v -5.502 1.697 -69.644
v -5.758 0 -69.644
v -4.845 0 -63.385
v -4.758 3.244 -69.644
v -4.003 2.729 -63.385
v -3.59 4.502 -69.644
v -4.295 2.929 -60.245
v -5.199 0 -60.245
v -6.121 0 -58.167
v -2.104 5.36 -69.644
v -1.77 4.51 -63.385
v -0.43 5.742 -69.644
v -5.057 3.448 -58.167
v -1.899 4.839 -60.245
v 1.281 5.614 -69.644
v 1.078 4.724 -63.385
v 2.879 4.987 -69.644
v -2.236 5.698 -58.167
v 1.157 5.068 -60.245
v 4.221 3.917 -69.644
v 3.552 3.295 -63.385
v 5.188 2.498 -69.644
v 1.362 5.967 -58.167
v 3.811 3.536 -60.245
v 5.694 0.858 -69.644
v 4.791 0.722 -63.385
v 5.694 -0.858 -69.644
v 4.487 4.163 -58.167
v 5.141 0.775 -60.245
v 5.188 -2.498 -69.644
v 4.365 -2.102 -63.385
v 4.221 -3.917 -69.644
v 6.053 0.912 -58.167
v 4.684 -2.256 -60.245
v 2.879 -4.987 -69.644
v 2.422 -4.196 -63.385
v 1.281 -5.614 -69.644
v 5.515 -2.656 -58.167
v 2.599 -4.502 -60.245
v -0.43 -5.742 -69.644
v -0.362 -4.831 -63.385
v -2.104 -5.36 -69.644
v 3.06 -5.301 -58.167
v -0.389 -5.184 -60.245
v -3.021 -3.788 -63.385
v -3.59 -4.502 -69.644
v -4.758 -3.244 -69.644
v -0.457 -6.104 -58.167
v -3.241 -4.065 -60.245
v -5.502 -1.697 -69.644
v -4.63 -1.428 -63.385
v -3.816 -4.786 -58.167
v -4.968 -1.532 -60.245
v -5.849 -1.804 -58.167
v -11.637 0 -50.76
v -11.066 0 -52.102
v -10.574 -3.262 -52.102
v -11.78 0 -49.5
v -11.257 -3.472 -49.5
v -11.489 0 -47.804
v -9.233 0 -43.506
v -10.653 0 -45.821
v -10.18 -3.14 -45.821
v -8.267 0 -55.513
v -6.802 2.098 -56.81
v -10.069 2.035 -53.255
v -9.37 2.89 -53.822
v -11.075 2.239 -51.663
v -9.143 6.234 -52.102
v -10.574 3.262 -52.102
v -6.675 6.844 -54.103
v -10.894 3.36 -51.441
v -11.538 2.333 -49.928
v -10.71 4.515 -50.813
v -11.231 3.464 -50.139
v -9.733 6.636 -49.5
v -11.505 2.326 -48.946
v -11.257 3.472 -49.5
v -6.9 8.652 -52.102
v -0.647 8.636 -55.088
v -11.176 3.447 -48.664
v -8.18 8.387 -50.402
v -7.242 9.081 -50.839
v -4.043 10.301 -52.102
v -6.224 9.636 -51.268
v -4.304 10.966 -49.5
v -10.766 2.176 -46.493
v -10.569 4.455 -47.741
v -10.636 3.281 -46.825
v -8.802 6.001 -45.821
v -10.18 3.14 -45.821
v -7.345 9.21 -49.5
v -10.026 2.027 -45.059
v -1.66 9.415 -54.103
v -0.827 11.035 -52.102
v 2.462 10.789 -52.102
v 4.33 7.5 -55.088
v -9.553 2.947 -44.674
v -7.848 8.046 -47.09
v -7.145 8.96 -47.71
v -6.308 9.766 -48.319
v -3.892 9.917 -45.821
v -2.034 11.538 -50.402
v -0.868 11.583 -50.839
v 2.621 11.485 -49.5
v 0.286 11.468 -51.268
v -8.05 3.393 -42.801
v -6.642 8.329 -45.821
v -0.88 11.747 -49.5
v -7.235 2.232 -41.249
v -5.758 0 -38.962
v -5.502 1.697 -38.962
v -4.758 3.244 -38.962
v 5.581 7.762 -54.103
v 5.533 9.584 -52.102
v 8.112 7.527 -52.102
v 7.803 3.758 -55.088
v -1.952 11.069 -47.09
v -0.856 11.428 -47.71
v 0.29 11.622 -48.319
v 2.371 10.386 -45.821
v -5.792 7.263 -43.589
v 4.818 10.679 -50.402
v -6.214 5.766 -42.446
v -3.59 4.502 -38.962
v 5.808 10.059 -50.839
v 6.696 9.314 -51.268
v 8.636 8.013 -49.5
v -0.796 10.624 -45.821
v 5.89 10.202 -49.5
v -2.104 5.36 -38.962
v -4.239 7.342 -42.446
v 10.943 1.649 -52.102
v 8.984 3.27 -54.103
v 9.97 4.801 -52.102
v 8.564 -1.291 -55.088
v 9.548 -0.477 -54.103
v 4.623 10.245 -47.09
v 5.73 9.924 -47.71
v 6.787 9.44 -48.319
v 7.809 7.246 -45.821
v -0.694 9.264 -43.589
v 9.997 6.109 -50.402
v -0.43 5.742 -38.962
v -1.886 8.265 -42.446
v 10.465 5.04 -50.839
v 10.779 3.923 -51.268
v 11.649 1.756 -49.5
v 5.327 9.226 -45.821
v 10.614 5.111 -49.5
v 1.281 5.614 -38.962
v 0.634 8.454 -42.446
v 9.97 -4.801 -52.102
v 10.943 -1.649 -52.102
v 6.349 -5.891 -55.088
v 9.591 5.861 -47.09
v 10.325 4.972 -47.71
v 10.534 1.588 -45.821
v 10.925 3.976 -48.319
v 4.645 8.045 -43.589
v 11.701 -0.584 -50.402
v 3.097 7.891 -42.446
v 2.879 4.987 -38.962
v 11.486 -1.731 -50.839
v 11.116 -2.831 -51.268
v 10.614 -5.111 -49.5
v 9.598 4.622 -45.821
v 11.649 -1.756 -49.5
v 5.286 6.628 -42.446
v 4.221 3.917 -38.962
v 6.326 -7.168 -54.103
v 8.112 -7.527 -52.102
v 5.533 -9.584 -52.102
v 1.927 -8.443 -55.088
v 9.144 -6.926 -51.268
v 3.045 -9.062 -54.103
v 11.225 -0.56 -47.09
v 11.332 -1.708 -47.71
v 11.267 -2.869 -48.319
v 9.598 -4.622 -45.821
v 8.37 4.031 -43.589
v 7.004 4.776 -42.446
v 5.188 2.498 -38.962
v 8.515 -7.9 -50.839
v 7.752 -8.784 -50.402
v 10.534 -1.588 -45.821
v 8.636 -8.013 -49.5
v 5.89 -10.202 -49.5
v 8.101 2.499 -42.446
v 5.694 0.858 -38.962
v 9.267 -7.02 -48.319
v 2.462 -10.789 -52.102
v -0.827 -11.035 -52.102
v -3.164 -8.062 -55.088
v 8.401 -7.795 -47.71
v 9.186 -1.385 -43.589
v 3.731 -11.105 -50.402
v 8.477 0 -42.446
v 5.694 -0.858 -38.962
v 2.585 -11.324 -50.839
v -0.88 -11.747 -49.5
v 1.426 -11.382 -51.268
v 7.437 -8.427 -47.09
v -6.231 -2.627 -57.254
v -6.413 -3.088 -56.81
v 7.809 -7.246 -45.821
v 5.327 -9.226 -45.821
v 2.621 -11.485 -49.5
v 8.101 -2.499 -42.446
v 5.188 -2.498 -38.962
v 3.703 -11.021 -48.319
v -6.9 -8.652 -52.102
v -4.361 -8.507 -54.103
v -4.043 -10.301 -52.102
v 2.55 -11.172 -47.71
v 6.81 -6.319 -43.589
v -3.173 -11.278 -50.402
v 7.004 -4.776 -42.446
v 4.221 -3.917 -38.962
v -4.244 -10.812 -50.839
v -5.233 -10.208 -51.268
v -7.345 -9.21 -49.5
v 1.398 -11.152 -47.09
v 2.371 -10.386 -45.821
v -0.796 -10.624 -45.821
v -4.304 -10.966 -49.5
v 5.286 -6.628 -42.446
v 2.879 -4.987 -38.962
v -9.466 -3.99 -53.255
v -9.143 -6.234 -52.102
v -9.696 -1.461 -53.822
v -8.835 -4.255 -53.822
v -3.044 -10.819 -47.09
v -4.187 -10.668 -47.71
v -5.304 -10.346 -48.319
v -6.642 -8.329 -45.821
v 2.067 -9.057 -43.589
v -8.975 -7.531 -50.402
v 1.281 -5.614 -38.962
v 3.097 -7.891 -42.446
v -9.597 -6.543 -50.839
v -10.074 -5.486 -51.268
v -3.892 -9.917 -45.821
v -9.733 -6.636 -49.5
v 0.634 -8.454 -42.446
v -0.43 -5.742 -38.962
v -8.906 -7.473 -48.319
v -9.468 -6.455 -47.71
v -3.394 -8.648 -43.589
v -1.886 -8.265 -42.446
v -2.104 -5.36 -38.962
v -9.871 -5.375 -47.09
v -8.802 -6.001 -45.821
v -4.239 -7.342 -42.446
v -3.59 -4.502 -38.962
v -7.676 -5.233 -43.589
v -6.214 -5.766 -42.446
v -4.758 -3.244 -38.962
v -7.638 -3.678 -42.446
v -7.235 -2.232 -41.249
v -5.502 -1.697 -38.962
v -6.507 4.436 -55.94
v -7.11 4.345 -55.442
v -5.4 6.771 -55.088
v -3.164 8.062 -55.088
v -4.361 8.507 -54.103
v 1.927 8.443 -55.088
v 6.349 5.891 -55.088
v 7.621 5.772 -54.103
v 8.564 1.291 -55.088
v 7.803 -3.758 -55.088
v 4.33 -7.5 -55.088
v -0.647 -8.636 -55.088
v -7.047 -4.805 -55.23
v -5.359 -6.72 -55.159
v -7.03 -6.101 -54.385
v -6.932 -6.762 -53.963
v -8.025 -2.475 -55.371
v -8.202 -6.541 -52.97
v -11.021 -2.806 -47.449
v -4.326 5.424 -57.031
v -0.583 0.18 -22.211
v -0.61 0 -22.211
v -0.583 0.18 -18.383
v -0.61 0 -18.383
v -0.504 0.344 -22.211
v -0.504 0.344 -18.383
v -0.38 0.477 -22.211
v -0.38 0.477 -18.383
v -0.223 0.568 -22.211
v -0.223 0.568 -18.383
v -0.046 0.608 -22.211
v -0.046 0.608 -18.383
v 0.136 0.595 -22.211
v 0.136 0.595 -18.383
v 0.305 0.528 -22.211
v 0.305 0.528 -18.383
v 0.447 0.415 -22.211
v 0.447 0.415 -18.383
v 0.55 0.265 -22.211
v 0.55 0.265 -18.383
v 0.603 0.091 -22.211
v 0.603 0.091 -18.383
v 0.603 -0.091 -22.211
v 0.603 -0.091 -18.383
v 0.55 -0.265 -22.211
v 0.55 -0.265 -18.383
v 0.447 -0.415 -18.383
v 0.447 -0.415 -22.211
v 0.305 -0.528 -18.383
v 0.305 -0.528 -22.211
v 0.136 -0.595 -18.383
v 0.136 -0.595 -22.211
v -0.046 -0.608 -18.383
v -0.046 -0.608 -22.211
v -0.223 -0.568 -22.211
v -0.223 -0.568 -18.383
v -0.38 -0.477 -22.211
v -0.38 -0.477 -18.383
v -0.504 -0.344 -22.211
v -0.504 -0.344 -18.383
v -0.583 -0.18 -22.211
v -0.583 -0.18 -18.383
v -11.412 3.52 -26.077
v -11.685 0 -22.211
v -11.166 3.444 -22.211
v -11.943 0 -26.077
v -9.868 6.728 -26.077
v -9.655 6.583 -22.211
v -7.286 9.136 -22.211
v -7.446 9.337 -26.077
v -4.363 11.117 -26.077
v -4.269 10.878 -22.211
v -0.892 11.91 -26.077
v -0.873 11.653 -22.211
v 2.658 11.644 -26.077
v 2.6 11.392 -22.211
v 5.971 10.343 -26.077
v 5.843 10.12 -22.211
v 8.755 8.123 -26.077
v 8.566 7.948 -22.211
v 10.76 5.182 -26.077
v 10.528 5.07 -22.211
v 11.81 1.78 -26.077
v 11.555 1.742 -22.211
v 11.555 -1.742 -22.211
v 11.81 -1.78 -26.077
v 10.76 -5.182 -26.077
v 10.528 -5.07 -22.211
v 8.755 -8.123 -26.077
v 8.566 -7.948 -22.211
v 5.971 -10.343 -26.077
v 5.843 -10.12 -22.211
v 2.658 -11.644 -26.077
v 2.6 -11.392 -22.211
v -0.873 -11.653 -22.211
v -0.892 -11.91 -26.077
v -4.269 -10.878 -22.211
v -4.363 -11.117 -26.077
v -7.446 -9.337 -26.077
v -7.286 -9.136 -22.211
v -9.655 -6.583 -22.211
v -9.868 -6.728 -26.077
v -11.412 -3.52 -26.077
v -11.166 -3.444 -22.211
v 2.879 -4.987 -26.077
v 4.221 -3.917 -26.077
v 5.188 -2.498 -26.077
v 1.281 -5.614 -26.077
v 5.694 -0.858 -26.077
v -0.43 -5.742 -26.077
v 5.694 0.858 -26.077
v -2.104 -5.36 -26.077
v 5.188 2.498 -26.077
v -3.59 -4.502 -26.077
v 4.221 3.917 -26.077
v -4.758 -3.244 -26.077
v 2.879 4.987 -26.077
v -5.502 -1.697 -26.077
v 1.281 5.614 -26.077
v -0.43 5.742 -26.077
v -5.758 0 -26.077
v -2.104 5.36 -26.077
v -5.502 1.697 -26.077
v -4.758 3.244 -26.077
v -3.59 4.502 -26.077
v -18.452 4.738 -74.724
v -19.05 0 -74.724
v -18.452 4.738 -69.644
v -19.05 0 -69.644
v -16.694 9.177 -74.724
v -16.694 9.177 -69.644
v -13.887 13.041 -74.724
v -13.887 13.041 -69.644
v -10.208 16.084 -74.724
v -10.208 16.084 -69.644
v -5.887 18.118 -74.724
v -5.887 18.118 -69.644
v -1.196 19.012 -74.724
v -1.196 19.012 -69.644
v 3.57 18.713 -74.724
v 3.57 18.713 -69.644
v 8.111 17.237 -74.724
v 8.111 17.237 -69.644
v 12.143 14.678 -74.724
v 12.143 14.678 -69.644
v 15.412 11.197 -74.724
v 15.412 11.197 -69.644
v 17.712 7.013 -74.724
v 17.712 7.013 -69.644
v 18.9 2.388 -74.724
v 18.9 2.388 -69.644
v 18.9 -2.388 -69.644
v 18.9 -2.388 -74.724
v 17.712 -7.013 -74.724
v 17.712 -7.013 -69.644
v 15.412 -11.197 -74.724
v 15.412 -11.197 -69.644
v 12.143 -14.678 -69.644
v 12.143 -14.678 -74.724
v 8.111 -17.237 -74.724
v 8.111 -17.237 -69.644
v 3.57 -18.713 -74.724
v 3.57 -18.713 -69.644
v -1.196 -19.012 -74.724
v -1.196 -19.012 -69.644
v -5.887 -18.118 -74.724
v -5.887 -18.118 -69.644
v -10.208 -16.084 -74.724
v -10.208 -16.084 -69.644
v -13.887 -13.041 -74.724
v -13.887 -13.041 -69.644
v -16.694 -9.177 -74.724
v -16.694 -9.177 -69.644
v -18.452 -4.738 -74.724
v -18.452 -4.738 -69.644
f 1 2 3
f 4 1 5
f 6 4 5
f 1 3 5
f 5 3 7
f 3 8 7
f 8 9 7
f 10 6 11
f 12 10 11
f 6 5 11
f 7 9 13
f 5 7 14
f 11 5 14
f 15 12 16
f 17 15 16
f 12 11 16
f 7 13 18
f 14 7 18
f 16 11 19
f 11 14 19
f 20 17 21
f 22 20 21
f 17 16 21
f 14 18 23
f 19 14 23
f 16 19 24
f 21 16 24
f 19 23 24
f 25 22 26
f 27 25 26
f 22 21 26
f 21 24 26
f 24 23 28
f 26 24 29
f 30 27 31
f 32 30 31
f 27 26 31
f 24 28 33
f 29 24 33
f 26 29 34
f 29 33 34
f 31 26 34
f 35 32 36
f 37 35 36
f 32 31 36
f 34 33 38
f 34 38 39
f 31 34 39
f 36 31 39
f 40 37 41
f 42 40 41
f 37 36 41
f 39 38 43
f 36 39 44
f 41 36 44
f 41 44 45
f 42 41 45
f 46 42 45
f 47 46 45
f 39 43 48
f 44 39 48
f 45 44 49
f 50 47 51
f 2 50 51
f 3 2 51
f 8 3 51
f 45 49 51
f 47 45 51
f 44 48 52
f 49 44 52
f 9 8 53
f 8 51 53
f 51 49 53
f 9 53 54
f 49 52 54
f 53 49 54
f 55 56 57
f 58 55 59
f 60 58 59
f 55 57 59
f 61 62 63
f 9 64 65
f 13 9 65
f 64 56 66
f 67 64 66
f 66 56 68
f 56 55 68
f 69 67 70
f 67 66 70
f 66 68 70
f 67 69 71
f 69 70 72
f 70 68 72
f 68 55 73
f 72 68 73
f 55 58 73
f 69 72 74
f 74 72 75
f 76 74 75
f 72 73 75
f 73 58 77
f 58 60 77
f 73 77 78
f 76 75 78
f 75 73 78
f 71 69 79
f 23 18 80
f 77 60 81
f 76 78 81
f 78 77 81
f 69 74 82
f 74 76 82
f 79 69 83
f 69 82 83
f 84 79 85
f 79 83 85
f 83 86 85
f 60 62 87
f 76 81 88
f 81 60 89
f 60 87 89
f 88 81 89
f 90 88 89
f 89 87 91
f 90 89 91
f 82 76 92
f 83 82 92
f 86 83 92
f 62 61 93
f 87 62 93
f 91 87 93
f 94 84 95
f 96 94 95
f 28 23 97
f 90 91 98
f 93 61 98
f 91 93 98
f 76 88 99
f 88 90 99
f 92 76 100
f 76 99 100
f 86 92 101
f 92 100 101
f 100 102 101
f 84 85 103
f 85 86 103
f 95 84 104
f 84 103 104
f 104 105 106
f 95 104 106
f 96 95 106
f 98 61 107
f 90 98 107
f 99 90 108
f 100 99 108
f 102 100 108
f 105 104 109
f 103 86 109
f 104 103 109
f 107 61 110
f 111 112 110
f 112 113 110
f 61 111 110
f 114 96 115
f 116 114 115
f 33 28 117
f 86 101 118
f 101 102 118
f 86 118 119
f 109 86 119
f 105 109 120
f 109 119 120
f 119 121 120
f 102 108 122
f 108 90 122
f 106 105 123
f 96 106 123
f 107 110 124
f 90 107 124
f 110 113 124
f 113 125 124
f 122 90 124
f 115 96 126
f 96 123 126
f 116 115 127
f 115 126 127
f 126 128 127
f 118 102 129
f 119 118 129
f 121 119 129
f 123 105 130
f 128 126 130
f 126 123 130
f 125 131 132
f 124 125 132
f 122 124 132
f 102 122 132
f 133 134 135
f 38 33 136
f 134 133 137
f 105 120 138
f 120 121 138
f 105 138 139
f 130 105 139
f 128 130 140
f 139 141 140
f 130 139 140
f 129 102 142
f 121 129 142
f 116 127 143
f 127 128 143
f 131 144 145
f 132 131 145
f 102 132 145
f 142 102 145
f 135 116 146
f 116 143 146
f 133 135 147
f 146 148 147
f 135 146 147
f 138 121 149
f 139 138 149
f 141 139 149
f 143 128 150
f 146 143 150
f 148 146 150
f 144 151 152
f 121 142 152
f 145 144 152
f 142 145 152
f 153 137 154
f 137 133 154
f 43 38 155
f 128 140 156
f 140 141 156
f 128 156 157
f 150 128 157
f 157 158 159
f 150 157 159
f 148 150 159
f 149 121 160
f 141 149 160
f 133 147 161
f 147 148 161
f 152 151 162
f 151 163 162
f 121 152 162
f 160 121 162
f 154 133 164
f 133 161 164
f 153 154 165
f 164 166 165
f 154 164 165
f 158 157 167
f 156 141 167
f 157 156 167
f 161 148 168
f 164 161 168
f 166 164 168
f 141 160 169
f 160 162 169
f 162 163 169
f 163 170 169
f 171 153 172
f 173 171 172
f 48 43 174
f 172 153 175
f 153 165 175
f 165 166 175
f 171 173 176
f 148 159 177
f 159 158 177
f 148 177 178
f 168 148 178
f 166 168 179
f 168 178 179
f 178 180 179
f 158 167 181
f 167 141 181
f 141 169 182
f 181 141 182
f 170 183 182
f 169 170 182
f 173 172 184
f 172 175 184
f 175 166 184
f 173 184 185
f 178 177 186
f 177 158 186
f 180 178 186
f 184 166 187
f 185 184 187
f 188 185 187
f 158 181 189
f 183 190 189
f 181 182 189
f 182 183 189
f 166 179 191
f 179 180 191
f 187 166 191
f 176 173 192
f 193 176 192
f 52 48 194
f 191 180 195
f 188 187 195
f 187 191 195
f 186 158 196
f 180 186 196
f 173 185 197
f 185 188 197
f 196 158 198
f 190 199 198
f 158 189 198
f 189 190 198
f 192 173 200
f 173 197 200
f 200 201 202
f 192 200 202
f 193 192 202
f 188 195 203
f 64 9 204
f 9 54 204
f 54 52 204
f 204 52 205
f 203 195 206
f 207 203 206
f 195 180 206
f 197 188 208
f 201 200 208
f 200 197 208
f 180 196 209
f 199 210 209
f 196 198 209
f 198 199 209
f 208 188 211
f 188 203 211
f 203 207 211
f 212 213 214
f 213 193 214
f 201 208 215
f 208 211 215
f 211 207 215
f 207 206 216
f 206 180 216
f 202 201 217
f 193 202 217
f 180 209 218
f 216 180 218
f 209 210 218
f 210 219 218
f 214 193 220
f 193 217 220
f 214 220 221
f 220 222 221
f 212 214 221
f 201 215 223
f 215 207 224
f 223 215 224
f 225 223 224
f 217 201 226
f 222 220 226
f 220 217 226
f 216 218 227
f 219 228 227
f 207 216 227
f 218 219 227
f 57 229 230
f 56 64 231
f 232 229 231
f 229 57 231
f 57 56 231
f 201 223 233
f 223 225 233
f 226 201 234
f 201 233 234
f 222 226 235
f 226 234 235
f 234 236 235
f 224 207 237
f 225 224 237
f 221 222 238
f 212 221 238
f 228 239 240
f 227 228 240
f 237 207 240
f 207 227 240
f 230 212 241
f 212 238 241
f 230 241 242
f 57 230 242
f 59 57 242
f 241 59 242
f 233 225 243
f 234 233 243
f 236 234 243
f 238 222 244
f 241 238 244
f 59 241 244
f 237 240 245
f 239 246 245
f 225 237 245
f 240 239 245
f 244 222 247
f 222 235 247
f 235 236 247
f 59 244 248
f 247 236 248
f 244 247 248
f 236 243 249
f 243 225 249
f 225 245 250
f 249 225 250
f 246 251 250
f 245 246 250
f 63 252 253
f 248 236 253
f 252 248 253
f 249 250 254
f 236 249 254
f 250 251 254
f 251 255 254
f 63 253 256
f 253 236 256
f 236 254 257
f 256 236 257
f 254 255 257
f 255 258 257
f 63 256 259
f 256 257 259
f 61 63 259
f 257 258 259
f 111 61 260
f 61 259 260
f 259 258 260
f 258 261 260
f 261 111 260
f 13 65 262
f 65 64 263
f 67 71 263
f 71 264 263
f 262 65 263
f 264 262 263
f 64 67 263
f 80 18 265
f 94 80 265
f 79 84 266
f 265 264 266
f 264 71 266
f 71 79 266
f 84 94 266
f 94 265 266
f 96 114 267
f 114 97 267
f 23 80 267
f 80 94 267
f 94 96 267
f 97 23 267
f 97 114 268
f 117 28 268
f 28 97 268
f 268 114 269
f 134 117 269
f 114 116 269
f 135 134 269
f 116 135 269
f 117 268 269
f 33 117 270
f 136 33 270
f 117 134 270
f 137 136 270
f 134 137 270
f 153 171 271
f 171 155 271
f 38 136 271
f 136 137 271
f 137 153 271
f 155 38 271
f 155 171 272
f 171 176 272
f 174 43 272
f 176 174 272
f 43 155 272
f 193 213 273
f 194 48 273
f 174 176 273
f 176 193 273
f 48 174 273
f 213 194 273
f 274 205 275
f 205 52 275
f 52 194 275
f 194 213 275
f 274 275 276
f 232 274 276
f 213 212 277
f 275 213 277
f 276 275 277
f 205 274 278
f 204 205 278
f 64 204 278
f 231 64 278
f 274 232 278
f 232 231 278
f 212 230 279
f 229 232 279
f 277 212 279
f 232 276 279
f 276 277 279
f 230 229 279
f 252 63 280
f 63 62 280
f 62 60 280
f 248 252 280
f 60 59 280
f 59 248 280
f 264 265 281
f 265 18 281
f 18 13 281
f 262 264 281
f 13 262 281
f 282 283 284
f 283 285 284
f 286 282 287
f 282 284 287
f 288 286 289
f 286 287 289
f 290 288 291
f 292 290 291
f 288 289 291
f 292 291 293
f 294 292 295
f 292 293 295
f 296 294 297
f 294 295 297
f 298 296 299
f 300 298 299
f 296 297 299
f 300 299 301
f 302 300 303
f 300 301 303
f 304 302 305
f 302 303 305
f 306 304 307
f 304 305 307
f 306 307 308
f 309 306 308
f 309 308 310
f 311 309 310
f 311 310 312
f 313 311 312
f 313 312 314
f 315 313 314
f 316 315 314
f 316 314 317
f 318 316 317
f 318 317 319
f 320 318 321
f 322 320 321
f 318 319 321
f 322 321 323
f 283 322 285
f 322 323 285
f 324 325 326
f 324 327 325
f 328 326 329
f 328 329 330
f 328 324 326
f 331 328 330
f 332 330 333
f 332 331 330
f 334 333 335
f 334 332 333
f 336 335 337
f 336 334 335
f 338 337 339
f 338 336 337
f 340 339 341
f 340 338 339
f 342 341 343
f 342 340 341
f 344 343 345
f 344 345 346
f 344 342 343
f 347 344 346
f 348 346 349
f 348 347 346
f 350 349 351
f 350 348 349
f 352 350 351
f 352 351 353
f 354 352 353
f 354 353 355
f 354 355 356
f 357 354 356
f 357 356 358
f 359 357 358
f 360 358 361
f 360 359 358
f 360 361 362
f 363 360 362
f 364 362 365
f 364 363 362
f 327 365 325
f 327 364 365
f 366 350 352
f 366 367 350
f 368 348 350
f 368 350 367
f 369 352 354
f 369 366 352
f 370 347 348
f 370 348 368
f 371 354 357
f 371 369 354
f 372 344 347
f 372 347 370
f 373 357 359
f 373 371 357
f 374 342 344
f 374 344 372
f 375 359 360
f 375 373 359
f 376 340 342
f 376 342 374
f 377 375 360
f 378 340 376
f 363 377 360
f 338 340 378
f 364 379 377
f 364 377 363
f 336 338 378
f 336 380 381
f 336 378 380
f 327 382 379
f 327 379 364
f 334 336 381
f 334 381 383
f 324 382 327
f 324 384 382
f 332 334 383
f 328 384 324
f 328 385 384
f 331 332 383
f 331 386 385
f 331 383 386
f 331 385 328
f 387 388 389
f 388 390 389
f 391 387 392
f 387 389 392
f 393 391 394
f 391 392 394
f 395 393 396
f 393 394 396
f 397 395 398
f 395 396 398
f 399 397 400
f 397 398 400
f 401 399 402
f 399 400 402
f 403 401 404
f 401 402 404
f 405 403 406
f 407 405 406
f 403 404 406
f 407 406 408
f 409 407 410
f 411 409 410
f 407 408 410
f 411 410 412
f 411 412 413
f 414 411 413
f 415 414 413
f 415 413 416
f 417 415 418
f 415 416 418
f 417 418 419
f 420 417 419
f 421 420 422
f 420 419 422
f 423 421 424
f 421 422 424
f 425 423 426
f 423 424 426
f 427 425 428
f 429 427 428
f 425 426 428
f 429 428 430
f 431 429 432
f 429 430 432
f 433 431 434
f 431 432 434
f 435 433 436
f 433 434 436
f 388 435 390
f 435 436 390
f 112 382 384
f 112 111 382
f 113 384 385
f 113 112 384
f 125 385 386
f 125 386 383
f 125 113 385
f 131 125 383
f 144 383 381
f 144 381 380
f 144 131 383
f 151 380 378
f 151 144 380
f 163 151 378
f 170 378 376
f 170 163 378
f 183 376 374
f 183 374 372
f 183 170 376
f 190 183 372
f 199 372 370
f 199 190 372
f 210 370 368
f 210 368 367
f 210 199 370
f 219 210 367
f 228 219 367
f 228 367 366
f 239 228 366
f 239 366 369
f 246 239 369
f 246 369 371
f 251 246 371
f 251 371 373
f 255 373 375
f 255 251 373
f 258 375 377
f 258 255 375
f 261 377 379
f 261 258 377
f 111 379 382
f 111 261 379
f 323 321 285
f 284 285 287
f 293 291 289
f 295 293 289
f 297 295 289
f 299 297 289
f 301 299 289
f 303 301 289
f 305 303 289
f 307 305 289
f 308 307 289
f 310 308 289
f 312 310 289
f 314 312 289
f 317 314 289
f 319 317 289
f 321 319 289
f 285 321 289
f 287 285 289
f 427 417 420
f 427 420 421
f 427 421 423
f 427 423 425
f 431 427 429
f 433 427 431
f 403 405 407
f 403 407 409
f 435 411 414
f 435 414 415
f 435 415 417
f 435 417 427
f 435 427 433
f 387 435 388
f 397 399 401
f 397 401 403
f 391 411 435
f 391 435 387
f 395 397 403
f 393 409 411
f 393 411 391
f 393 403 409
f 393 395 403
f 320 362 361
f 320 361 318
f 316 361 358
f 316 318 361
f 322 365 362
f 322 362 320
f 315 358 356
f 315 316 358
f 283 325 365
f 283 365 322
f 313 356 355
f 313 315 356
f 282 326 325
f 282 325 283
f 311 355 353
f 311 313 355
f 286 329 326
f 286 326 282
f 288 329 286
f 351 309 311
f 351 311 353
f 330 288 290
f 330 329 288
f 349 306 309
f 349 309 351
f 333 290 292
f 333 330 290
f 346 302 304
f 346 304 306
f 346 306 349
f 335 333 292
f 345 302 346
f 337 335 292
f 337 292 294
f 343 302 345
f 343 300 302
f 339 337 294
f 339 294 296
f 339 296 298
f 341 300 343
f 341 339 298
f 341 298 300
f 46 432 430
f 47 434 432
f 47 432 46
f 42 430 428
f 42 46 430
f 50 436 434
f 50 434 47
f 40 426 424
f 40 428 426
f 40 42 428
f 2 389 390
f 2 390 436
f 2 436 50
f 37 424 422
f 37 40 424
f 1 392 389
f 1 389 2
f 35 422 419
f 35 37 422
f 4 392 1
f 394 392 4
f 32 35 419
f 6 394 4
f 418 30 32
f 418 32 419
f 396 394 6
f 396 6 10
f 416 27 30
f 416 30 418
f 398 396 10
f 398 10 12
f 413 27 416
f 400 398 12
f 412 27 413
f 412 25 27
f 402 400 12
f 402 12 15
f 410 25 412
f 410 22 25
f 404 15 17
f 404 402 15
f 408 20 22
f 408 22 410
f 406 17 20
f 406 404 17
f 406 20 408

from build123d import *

# Parameters (mm, degrees)
F0_W   = 13.291821114
F0_H   = 5.08
F0_W_2 = 0.6099150633
F0_H_2 = 3.8282163441


with BuildPart() as f1:
    # F0 (on Front) → F1 (revolve)
    with BuildSketch(Plane.XZ):
        with Locations((-12.404089443, -72.1843269592)):
            Rectangle(F0_W, F0_H)
        Polygon((-5.758178886, -69.6443269592), (-5.758178886, -74.7243269592), (-4.7780917957, -74.7243269592), (0, -74.7243269592), (0, -69.6443269592), align=None)
        with BuildLine():
            add(Edge.make_bspline(
                [(-5.758178886, -69.6443269592), (-4.9648323817, -65.7790976541), (-3.4035942307, -58.1726565582), (-15.3237312615, -50.8868167952), (-9.0760322015, -43.097913485), (-5.758178886, -38.9616005123)],
                knots=[0, 0, 0, 0, 0.3263693982, 0.6422670964, 1, 1, 1, 1], degree=3))
            Line((-5.758178886, -69.6443269592), (0, -69.6443269592))
            Line((0, -69.6443269592), (0, -22.2111493349))
            Line((0, -22.2111493349), (-0.6099150633, -22.2111493349))
            Line((-0.6099150633, -22.2111493349), (-11.6852605715, -22.2111493349))
            Line((-11.6852605715, -22.2111493349), (-11.9429603219, -26.0766372085))
            Line((-11.9429603219, -26.0766372085), (-5.758178886, -26.0766372085))
            Line((-5.758178886, -26.0766372085), (-5.758178886, -38.9616005123))
        make_face()
        with Locations((-0.3049575316, -20.2970411628)):
            Rectangle(F0_W_2, F0_H_2)
    revolve(axis=Axis((0, 0, -0.6833137407), (0, 0, -1)))


solid = f1.part
